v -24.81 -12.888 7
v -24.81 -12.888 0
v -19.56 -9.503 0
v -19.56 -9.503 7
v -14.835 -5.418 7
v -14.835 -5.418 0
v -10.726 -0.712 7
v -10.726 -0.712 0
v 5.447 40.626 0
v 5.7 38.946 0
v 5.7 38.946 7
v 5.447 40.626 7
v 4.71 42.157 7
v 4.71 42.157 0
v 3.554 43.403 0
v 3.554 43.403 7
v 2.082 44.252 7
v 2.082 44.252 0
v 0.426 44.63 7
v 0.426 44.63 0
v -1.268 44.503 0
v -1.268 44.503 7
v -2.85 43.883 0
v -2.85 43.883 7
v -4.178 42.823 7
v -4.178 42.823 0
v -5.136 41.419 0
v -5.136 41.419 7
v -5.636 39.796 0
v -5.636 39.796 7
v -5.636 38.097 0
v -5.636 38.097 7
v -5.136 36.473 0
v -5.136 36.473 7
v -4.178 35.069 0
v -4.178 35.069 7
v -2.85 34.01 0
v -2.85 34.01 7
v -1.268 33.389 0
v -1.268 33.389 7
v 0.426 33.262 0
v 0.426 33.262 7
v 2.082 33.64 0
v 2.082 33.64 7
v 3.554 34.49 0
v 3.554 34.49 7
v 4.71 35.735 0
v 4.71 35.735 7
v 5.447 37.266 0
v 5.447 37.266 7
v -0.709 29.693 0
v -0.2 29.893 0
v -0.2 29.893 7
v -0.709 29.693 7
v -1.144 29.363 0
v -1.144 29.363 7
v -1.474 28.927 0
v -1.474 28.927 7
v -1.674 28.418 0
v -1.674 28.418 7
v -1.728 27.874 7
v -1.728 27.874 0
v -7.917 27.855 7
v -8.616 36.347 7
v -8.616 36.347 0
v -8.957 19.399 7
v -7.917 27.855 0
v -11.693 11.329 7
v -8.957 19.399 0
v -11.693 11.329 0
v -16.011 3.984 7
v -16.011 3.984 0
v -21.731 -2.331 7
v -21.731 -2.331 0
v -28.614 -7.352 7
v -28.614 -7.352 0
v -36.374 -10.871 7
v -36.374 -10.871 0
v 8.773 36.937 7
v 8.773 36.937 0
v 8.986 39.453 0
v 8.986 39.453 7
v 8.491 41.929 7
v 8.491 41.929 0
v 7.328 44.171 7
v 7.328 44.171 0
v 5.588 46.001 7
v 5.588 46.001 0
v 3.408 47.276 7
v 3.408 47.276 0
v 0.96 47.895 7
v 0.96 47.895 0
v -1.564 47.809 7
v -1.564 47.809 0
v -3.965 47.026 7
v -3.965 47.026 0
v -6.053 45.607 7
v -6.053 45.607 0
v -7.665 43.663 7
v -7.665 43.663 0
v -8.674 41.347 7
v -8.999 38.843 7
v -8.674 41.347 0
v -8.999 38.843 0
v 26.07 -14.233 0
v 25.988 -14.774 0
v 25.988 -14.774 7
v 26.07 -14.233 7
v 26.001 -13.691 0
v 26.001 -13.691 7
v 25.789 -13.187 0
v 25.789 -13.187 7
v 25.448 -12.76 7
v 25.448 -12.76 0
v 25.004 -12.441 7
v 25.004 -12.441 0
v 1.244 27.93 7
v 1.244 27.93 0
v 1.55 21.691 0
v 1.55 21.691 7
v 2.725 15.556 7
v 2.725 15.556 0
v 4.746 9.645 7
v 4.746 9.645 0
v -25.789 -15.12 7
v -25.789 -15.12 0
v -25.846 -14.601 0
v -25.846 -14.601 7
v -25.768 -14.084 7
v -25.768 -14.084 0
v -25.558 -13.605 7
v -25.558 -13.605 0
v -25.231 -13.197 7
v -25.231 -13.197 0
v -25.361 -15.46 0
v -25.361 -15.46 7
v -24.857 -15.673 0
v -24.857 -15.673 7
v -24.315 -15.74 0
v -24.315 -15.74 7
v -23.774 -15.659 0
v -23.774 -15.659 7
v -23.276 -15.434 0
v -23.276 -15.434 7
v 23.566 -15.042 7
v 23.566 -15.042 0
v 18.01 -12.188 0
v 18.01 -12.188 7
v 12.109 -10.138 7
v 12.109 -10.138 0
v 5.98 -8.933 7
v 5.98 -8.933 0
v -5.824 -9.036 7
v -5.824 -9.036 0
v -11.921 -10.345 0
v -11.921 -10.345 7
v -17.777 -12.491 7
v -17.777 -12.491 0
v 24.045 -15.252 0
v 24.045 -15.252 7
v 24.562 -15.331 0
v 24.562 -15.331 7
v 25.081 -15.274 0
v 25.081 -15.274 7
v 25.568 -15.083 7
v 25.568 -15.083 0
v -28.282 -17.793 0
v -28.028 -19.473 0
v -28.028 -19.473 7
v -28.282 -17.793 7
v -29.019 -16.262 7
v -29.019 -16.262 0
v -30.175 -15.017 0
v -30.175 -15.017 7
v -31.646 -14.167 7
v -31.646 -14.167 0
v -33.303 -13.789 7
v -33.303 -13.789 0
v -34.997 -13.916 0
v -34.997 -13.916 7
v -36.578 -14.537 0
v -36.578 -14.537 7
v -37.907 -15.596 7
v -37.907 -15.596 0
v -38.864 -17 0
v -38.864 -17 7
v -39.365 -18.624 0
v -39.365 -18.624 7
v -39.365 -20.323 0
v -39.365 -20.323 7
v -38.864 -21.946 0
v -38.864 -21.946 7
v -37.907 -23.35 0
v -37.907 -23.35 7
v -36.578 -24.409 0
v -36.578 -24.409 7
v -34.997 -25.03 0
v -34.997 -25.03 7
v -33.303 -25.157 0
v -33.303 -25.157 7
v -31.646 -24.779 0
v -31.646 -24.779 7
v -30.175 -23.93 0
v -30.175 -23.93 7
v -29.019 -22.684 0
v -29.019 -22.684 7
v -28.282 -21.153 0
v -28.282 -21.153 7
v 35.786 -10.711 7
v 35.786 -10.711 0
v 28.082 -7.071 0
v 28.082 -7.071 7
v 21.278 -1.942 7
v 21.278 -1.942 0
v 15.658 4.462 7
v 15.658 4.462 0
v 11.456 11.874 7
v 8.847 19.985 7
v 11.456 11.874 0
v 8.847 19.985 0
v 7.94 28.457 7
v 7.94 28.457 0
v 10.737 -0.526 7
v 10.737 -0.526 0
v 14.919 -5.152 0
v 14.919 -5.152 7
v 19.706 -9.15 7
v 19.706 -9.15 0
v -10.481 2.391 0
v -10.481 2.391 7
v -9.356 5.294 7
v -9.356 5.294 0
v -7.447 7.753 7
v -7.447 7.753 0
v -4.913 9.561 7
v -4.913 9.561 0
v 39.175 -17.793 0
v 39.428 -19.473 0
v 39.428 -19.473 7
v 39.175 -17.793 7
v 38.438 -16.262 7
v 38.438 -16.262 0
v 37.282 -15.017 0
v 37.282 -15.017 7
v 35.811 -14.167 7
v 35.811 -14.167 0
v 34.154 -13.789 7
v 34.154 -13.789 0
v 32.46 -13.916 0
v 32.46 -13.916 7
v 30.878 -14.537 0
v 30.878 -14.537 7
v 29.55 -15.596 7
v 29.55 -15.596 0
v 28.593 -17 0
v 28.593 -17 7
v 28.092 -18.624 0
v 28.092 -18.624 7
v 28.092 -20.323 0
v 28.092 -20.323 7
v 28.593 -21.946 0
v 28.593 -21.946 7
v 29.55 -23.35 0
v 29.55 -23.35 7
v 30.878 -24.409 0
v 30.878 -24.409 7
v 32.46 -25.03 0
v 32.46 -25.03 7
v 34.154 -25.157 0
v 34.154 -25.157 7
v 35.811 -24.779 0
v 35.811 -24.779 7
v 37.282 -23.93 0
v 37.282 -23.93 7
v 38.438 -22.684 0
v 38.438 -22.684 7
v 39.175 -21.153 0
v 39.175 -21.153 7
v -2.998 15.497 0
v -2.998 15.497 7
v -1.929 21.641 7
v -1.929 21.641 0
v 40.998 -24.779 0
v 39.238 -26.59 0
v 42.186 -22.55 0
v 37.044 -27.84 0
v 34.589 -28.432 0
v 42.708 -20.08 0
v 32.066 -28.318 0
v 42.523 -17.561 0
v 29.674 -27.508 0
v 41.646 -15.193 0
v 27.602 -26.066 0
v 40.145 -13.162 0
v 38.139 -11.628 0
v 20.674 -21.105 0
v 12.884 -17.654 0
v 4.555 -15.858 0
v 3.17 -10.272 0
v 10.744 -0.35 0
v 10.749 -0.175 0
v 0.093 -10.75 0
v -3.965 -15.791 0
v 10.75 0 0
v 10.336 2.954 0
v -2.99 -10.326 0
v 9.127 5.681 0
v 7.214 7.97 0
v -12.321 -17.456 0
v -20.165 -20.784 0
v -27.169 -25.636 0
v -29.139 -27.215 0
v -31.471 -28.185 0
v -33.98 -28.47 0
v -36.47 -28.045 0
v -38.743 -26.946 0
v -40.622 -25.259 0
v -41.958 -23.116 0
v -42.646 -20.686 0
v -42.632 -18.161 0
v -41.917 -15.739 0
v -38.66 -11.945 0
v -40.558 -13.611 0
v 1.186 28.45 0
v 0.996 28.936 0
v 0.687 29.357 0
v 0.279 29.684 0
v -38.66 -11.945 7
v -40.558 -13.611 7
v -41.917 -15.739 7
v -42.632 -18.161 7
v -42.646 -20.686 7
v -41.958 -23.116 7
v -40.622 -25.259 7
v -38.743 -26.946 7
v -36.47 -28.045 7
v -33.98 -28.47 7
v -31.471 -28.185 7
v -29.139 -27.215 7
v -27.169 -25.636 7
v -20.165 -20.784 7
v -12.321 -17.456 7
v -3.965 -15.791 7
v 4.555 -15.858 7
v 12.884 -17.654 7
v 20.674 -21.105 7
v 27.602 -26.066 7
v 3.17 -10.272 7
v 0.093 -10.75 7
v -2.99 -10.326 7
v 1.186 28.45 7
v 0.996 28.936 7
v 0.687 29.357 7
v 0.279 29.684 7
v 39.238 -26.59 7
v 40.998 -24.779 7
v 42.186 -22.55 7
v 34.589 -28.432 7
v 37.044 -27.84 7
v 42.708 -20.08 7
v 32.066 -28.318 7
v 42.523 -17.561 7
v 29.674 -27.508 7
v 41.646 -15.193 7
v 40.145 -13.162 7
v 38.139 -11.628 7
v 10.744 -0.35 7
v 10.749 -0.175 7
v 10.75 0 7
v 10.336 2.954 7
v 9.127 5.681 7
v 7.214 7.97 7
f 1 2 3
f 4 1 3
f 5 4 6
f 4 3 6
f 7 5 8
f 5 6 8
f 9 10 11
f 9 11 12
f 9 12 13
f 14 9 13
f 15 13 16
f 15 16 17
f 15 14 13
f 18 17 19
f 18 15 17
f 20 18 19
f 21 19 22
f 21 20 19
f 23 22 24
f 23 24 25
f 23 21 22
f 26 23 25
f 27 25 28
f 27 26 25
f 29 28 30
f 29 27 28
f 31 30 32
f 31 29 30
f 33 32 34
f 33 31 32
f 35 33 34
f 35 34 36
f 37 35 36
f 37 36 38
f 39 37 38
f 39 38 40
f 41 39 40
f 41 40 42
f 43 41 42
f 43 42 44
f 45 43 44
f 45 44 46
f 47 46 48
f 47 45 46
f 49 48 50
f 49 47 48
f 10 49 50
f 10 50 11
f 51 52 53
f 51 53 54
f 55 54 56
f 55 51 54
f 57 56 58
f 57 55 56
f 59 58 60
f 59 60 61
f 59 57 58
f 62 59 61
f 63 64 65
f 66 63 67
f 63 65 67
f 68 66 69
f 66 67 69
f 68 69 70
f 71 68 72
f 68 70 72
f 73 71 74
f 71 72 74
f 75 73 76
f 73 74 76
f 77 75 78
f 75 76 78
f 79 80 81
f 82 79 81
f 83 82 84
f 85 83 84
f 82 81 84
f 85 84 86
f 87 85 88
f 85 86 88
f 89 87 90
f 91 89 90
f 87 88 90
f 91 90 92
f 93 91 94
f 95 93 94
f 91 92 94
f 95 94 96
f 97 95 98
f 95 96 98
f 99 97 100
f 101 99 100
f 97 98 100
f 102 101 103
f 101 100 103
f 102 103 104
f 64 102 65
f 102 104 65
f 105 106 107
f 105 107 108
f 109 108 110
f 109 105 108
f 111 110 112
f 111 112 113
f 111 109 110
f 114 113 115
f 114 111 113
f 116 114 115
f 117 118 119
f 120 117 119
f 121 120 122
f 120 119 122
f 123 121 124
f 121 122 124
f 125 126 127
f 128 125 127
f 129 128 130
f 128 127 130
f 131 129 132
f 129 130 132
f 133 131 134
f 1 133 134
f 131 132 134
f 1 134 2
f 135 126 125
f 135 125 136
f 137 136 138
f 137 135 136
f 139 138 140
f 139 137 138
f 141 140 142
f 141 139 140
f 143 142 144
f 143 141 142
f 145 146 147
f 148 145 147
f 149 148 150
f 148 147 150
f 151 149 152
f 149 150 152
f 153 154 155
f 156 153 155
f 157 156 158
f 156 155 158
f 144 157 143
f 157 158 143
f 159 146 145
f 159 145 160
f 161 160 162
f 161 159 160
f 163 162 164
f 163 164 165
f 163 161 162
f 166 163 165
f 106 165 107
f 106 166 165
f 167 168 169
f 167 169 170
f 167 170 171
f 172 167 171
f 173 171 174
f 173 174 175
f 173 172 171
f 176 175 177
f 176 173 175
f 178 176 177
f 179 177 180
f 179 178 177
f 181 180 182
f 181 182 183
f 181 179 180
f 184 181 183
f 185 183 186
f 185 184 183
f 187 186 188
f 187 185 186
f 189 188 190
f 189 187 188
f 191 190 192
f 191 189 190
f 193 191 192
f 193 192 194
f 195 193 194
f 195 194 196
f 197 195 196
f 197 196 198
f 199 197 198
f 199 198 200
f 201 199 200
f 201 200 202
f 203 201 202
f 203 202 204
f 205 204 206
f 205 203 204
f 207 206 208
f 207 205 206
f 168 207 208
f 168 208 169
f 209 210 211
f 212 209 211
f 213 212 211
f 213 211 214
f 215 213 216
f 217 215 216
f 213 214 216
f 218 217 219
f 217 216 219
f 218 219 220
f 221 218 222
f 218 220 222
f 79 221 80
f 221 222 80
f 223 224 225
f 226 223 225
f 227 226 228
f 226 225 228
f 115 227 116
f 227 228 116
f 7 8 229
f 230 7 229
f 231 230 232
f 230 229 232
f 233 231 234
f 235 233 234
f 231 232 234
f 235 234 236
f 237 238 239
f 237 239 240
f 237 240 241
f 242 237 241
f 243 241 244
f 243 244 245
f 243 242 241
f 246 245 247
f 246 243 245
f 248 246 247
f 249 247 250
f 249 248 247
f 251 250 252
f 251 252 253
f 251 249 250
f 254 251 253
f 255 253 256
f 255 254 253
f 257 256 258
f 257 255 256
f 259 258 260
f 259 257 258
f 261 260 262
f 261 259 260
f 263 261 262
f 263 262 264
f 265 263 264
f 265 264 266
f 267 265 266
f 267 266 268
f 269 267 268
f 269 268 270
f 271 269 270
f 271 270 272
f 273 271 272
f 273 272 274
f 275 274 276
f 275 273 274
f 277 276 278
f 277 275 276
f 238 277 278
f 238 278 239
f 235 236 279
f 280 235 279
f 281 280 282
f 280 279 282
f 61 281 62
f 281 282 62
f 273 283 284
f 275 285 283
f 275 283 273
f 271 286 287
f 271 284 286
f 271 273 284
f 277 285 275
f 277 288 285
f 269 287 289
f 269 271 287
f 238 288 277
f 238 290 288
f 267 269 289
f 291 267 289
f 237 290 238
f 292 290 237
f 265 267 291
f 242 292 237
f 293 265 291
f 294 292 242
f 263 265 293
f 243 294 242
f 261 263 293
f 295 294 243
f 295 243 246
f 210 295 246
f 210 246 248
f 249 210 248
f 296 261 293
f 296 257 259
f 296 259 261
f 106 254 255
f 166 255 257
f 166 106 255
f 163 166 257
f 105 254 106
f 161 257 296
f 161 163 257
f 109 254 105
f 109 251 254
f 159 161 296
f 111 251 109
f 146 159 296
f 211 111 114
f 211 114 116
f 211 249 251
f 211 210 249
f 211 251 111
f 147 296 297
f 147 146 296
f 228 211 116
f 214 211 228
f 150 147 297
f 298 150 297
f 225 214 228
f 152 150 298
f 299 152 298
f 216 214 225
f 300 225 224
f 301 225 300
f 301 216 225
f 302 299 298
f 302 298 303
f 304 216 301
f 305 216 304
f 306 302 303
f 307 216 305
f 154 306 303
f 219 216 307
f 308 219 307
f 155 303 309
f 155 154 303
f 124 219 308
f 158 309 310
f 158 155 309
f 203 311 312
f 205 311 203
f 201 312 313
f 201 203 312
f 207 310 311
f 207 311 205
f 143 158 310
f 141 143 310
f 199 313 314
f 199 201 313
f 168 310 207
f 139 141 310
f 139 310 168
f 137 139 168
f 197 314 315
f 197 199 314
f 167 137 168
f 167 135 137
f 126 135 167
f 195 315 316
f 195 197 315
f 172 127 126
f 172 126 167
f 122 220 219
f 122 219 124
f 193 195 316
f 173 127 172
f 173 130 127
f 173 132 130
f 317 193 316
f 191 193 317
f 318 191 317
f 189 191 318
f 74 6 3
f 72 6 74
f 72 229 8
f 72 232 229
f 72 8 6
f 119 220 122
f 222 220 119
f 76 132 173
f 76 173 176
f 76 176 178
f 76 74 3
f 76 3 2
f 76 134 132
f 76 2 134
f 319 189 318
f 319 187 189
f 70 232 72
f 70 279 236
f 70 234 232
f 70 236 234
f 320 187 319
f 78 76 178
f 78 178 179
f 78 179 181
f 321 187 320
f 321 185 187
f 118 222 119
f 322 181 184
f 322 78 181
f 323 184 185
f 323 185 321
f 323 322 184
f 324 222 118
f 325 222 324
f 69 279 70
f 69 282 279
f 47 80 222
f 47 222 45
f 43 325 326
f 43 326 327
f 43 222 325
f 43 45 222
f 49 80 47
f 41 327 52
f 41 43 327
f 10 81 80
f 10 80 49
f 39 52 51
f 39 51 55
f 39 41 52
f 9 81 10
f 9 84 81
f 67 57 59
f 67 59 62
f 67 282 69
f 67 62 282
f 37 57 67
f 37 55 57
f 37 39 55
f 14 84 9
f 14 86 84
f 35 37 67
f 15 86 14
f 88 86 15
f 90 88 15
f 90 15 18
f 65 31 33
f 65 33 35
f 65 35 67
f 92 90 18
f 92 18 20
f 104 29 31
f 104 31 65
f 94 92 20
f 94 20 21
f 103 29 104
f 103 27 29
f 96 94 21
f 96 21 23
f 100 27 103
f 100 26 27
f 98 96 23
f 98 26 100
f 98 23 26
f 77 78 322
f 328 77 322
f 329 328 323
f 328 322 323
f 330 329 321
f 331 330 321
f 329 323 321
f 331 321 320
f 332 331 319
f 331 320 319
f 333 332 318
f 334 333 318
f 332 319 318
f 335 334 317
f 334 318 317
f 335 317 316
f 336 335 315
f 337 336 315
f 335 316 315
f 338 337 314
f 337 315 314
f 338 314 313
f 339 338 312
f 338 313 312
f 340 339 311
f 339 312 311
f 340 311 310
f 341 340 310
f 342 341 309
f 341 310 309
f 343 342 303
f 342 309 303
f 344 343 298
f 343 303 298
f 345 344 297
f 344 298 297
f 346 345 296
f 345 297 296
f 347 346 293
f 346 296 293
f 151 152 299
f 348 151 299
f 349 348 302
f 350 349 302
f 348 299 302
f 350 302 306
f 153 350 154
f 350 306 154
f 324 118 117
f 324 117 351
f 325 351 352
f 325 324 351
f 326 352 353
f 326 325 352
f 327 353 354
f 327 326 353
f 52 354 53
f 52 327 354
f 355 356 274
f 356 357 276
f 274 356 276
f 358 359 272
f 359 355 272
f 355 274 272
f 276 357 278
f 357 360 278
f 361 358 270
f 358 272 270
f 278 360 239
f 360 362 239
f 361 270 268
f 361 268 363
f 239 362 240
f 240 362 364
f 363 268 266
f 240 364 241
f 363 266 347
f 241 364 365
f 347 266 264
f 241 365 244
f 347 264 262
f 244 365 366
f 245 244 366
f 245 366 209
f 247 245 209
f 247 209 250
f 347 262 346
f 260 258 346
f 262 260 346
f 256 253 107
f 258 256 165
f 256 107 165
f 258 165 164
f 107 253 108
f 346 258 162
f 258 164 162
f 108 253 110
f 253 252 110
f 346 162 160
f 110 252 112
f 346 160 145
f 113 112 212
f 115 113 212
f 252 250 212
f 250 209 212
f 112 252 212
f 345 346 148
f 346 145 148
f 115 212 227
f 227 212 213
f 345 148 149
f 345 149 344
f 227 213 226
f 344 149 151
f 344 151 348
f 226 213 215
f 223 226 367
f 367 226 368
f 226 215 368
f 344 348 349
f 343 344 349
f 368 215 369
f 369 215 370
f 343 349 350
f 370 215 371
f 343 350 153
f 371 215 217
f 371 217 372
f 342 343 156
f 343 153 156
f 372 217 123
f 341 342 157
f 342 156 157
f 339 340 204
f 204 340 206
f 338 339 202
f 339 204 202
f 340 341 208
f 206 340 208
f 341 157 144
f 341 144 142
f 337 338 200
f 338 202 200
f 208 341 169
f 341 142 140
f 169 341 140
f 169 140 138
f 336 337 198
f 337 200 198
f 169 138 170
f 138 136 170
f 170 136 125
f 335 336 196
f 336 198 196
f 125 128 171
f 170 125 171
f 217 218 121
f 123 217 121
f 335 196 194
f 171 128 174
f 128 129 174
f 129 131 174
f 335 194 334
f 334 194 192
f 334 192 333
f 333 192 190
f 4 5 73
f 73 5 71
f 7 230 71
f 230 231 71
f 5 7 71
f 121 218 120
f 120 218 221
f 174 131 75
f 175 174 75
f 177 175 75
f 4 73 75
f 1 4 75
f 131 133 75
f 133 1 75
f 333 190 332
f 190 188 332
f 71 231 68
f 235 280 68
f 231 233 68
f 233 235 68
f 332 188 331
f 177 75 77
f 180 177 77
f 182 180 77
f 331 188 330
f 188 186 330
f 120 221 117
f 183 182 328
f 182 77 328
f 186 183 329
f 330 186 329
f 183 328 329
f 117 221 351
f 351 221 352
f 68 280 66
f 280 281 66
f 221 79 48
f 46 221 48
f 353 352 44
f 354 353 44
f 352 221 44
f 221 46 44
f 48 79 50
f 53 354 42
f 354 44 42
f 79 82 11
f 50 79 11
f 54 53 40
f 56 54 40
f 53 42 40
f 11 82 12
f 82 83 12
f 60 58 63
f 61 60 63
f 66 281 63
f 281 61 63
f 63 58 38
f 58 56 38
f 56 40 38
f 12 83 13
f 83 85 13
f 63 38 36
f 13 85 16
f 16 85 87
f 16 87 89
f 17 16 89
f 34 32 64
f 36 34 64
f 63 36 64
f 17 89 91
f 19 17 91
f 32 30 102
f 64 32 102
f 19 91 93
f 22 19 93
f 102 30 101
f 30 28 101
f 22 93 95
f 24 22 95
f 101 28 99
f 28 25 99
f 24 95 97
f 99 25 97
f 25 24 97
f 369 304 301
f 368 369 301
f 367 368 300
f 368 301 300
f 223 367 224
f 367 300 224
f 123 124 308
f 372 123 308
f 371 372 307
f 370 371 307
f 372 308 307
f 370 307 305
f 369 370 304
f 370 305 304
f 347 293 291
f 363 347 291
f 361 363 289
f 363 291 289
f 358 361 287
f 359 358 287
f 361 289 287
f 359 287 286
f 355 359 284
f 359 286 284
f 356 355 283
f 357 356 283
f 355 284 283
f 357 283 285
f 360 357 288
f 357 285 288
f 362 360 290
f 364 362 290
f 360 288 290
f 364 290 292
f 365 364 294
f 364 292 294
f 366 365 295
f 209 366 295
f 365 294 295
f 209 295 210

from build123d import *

# Parameters (mm, degrees)
F0_R        = 5.7
F1_DEPTH    = 7
F2_T1_DEPTH = 7


# Not quite as in the source:
# - a fillet or chamfer that OpenCascade refuses, or shapes differently, is made with other operations: its cross-section is extruded or revolved along the edge and cut away or added


with BuildPart() as f1:
    # F0 (on Top) → F1 (new body)
    with BuildSketch(Plane.XY):
        with BuildLine():
            ThreePointArc((35.7857254885, -10.7114257283), (13.3672908486, 8.0601420356), (8.7727432709, 36.9365701488))
            ThreePointArc((8.7727432709, 36.9365701488), (-0.3049324387, 47.9411231542), (-8.6164959528, 36.3470602301))
            ThreePointArc((-8.6164959528, 36.3470602301), (-13.6639331853, 7.5463424369), (-36.374379713, -10.8708665409))
            ThreePointArc((-36.374379713, -10.8708665409), (-41.3657643181, -24.2346408155), (-27.1692295357, -25.6356345017))
            ThreePointArc((-27.1692295357, -25.6356345017), (0.2966423367, -15.6064844725), (27.6016364421, -26.0657036079))
            ThreePointArc((27.6016364421, -26.0657036079), (41.6706967568, -23.7064823387), (35.7857254885, -10.7114257283))
        make_face()
        with Locations((-33.7284768728, -19.4731452019)):
            Circle(F0_R, mode=Mode.SUBTRACT)
        with Locations((33.7284768728, -19.4731452019)):
            Circle(F0_R, mode=Mode.SUBTRACT)
        with BuildLine():
            ThreePointArc((4.7464996897, 9.6453740568), (9.1265374503, 5.6805645994), (10.75, 0))
            ThreePointArc((10.75, 0), (10.7467864276, -0.2628335582), (10.7371476318, -0.5255099751))
            ThreePointArc((10.7371476318, -0.5255099751), (18.1244877352, -7.9521533479), (27.0404212358, -13.4506945549))
            ThreePointArc((27.0404212358, -13.4506945549), (26.0732155549, -14.7406010495), (25.3516724639, -16.1823781342))
            ThreePointArc((25.3516724639, -16.1823781342), (16.0918632419, -11.4192065952), (5.9798891173, -8.9332763388))
            ThreePointArc((5.9798891173, -8.9332763388), (0.0934488338, -10.749593821), (-5.8236788043, -9.0358876257))
            ThreePointArc((-5.8236788043, -9.0358876257), (-15.9490106817, -11.7201901353), (-25.168853801, -16.6923444418))
            ThreePointArc((-25.168853801, -16.6923444418), (-25.8023427534, -15.2097665041), (-26.6901867898, -13.864003315))
            ThreePointArc((-26.6901867898, -13.864003315), (-17.9352546235, -8.2263590641), (-10.726388807, -0.712097718))
            ThreePointArc((-10.726388807, -0.712097718), (-9.3561457462, 5.2938678465), (-4.9134688275, 9.5613976008))
            ThreePointArc((-4.9134688275, 9.5613976008), (-2.1754770535, 19.6723434832), (-1.8715674348, 30.1430389967))
            ThreePointArc((-1.8715674348, 30.1430389967), (-0.2708728015, 29.9503675537), (1.3385143259, 30.0463814492))
            ThreePointArc((1.3385143259, 30.0463814492), (1.8433913815, 19.6455656593), (4.7464996897, 9.6453740568))
        make_face(mode=Mode.SUBTRACT)
        with Locations((0, 38.9462904038)):
            Circle(F0_R, mode=Mode.SUBTRACT)
    extrude(amount=F1_DEPTH)

    # F2: fillet of radius 2 on 6 edges, made by hand

    # F2_s2 → F2_t1 (join)
    with BuildSketch(Plane.XY):
        with BuildLine():
            ThreePointArc((1.2437301381, 27.9302712072), (0.7204204263, 29.321617428), (-0.6184050998, 29.9675613661))
            ThreePointArc((-0.6184050998, 29.9675613661), (0.362205019, 29.9535818283), (1.3385143259, 30.0463814492))
            ThreePointArc((1.3385143259, 30.0463814492), (1.278556326, 28.9888891766), (1.2437301381, 27.9302712072))
        make_face()
        with BuildLine():
            ThreePointArc((0.2214111543, 29.9490143104), (-1.1869742591, 29.3190857733), (-1.7279638998, 27.8742018185))
            ThreePointArc((-1.7279638998, 27.8742018185), (-1.7853057388, 29.0095356327), (-1.8715674348, 30.1430389967))
            ThreePointArc((-1.8715674348, 30.1430389967), (-0.8307618987, 29.984714947), (0.2214111543, 29.9490143104))
        make_face()
        with BuildLine():
            ThreePointArc((23.566459331, -15.0422374987), (25.0330553595, -15.2847111045), (26.2618719824, -14.4482261568))
            ThreePointArc((26.2618719824, -14.4482261568), (25.7594602881, -15.290469662), (25.3516724639, -16.1823781342))
            ThreePointArc((25.3516724639, -16.1823781342), (24.4658362914, -15.6017068468), (23.566459331, -15.0422374987))
        make_face()
        with BuildLine():
            ThreePointArc((25.825901634, -15.1662548395), (25.9845602249, -13.6315930247), (25.0037488349, -12.4406402752))
            ThreePointArc((25.0037488349, -12.4406402752), (26.0156476793, -12.958647693), (27.0404212358, -13.4506945549))
            ThreePointArc((27.0404212358, -13.4506945549), (26.3829058187, -14.2728965647), (25.825901634, -15.1662548395))
        make_face()
        with BuildLine():
            ThreePointArc((-25.6434668826, -15.5193352093), (-25.7534757858, -14.0369063234), (-24.8101894691, -12.8880337086))
            ThreePointArc((-24.8101894691, -12.8880337086), (-25.7443926174, -13.3871823298), (-26.6901867898, -13.864003315))
            ThreePointArc((-26.6901867898, -13.864003315), (-26.1216653071, -14.6631121663), (-25.6434668826, -15.5193352093))
        make_face()
        with BuildLine():
            ThreePointArc((-26.0473127882, -14.7827594709), (-24.7975859659, -15.6874927486), (-23.2757849351, -15.4335615433))
            ThreePointArc((-23.2757849351, -15.4335615433), (-24.2303419405, -16.0508879397), (-25.168853801, -16.6923444418))
            ThreePointArc((-25.168853801, -16.6923444418), (-25.55214392, -15.7118183822), (-26.0473127882, -14.7827594709))
        make_face()
    extrude(amount=F2_T1_DEPTH)


solid = f1.part
